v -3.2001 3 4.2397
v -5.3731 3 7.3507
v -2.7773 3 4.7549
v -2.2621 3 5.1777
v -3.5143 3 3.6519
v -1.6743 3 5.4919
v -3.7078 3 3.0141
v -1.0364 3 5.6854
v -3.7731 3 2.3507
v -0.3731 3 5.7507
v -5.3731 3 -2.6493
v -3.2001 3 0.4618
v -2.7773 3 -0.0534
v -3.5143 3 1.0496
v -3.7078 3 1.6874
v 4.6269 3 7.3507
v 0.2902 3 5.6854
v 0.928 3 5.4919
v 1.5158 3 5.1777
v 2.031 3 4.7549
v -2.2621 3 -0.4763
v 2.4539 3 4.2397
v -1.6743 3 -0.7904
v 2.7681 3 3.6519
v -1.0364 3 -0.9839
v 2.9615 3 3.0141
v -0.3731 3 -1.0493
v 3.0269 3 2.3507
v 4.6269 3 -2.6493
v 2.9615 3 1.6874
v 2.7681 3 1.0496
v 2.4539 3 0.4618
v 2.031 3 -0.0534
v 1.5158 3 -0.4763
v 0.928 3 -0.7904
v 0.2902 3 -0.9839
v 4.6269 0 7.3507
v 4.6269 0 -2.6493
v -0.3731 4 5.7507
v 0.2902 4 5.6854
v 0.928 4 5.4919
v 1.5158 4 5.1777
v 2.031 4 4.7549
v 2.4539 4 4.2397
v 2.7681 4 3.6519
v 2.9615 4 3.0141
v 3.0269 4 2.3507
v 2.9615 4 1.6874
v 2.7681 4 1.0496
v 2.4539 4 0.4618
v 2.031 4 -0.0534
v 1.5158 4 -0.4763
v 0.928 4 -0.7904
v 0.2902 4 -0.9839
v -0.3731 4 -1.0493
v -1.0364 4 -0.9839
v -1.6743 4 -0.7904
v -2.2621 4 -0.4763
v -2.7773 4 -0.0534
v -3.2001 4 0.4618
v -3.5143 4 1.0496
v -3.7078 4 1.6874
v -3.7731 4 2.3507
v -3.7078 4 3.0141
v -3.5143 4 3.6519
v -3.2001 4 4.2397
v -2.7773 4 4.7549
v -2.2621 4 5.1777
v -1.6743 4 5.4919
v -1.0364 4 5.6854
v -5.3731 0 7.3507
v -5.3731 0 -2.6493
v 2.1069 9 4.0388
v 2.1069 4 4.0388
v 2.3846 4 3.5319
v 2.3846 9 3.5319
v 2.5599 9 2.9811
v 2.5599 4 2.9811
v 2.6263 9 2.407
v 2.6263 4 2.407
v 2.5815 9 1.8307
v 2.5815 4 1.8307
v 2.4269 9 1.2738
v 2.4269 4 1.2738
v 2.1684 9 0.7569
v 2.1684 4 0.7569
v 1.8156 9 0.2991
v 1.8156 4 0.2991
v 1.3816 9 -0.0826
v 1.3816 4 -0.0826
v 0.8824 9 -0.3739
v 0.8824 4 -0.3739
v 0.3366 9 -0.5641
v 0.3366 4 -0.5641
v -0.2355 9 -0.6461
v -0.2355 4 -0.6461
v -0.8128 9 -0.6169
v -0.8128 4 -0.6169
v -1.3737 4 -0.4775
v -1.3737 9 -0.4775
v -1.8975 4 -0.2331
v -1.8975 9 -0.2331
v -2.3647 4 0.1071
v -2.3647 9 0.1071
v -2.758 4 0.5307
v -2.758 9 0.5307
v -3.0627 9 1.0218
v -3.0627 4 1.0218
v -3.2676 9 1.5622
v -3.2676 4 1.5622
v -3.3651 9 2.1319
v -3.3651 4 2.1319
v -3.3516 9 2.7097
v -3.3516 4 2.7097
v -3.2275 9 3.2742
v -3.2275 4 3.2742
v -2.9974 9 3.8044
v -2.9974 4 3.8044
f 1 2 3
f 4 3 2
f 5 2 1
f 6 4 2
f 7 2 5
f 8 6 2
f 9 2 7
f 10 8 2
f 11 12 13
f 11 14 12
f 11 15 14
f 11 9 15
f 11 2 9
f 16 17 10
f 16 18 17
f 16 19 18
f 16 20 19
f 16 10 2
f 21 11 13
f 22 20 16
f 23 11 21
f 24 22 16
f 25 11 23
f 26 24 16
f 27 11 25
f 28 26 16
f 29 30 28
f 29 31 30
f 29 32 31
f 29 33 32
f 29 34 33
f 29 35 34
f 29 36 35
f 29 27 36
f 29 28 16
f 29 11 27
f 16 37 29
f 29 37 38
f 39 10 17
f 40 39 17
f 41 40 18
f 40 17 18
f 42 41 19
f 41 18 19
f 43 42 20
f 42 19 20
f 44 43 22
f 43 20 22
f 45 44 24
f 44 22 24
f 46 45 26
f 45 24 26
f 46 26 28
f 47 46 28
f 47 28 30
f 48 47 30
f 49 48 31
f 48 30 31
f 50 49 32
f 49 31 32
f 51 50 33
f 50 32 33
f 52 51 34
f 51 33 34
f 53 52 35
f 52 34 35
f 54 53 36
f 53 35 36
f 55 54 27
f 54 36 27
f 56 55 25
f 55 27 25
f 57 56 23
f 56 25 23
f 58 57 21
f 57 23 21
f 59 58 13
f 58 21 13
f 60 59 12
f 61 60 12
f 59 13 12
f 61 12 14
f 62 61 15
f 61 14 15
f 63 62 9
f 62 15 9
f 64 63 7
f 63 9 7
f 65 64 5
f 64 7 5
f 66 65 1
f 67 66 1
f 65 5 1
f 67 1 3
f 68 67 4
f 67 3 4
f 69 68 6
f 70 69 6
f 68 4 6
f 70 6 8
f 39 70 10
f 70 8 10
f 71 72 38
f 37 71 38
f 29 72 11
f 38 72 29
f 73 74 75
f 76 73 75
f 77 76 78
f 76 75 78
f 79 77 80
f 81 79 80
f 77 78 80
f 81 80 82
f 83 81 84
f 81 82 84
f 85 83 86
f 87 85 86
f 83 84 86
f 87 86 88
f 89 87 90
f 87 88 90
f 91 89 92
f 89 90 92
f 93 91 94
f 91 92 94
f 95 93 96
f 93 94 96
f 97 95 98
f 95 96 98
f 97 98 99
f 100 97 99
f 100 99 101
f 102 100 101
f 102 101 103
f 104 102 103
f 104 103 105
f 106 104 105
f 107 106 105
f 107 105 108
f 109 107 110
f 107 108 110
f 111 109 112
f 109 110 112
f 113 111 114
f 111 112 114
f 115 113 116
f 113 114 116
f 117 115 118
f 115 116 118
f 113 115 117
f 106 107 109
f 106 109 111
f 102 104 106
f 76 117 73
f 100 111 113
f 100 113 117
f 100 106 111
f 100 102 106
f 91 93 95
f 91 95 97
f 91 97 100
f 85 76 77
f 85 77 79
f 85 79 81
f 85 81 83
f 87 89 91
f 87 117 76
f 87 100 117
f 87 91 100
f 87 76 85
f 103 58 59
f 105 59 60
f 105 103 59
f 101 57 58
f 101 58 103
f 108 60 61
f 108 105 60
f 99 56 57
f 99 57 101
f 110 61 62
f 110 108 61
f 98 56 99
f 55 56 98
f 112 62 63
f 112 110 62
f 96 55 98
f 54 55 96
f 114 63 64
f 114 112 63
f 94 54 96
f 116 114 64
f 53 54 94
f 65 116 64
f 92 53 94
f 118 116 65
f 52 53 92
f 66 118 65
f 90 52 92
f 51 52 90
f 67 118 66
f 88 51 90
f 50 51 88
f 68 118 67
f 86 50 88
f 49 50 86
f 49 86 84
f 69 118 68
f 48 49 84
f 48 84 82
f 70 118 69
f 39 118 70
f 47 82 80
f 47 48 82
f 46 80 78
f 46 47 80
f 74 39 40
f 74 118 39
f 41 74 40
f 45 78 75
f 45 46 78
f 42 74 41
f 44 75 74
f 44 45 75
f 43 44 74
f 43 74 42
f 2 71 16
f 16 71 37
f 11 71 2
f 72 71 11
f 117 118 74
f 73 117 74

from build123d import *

# Parameters (mm, degrees)
SKETCH_1_W      = 10
SKETCH_1_H      = 10
EXTRUDE_1_DEPTH = 3
SKETCH_2_R      = 3.4
EXTRUDE_2_DEPTH = 1
EXTRUDE_3_DEPTH = 5


with BuildPart() as part:
    # 草图1 → 凸台-拉伸1 (new body)
    with BuildSketch(Plane(origin=(0, 0, 0), x_dir=(1, 0, 0), z_dir=(0, 1, 0))):
        with Locations((-0.373134328, -2.350746269)):
            Rectangle(SKETCH_1_W, SKETCH_1_H)
    extrude(amount=EXTRUDE_1_DEPTH)

    # 草图2 → 凸台-拉伸2 (add)
    with BuildSketch(Plane(origin=(0, 3, 0), x_dir=(1, 0, 0), z_dir=(0, 1, 0))):
        with Locations(Location((-0.373134328, -2.350746269, 0), (0, 0, 270))):
            Circle(SKETCH_2_R)
    extrude(amount=EXTRUDE_2_DEPTH)

    # 草图3 → 凸台-拉伸3 (add)
    with BuildSketch(Plane(origin=(0, 4, 0), x_dir=(1, 0, 0), z_dir=(0, 1, 0))):
        with BuildLine():
            Line((-2.997411901, -3.804419967), (2.106902355, -4.038768203))
            ThreePointArc((2.106902355, -4.038768203), (-0.235543876, 0.646096882), (-2.997411901, -3.804419967))
        make_face()
    extrude(amount=EXTRUDE_3_DEPTH)


solid = part.part
